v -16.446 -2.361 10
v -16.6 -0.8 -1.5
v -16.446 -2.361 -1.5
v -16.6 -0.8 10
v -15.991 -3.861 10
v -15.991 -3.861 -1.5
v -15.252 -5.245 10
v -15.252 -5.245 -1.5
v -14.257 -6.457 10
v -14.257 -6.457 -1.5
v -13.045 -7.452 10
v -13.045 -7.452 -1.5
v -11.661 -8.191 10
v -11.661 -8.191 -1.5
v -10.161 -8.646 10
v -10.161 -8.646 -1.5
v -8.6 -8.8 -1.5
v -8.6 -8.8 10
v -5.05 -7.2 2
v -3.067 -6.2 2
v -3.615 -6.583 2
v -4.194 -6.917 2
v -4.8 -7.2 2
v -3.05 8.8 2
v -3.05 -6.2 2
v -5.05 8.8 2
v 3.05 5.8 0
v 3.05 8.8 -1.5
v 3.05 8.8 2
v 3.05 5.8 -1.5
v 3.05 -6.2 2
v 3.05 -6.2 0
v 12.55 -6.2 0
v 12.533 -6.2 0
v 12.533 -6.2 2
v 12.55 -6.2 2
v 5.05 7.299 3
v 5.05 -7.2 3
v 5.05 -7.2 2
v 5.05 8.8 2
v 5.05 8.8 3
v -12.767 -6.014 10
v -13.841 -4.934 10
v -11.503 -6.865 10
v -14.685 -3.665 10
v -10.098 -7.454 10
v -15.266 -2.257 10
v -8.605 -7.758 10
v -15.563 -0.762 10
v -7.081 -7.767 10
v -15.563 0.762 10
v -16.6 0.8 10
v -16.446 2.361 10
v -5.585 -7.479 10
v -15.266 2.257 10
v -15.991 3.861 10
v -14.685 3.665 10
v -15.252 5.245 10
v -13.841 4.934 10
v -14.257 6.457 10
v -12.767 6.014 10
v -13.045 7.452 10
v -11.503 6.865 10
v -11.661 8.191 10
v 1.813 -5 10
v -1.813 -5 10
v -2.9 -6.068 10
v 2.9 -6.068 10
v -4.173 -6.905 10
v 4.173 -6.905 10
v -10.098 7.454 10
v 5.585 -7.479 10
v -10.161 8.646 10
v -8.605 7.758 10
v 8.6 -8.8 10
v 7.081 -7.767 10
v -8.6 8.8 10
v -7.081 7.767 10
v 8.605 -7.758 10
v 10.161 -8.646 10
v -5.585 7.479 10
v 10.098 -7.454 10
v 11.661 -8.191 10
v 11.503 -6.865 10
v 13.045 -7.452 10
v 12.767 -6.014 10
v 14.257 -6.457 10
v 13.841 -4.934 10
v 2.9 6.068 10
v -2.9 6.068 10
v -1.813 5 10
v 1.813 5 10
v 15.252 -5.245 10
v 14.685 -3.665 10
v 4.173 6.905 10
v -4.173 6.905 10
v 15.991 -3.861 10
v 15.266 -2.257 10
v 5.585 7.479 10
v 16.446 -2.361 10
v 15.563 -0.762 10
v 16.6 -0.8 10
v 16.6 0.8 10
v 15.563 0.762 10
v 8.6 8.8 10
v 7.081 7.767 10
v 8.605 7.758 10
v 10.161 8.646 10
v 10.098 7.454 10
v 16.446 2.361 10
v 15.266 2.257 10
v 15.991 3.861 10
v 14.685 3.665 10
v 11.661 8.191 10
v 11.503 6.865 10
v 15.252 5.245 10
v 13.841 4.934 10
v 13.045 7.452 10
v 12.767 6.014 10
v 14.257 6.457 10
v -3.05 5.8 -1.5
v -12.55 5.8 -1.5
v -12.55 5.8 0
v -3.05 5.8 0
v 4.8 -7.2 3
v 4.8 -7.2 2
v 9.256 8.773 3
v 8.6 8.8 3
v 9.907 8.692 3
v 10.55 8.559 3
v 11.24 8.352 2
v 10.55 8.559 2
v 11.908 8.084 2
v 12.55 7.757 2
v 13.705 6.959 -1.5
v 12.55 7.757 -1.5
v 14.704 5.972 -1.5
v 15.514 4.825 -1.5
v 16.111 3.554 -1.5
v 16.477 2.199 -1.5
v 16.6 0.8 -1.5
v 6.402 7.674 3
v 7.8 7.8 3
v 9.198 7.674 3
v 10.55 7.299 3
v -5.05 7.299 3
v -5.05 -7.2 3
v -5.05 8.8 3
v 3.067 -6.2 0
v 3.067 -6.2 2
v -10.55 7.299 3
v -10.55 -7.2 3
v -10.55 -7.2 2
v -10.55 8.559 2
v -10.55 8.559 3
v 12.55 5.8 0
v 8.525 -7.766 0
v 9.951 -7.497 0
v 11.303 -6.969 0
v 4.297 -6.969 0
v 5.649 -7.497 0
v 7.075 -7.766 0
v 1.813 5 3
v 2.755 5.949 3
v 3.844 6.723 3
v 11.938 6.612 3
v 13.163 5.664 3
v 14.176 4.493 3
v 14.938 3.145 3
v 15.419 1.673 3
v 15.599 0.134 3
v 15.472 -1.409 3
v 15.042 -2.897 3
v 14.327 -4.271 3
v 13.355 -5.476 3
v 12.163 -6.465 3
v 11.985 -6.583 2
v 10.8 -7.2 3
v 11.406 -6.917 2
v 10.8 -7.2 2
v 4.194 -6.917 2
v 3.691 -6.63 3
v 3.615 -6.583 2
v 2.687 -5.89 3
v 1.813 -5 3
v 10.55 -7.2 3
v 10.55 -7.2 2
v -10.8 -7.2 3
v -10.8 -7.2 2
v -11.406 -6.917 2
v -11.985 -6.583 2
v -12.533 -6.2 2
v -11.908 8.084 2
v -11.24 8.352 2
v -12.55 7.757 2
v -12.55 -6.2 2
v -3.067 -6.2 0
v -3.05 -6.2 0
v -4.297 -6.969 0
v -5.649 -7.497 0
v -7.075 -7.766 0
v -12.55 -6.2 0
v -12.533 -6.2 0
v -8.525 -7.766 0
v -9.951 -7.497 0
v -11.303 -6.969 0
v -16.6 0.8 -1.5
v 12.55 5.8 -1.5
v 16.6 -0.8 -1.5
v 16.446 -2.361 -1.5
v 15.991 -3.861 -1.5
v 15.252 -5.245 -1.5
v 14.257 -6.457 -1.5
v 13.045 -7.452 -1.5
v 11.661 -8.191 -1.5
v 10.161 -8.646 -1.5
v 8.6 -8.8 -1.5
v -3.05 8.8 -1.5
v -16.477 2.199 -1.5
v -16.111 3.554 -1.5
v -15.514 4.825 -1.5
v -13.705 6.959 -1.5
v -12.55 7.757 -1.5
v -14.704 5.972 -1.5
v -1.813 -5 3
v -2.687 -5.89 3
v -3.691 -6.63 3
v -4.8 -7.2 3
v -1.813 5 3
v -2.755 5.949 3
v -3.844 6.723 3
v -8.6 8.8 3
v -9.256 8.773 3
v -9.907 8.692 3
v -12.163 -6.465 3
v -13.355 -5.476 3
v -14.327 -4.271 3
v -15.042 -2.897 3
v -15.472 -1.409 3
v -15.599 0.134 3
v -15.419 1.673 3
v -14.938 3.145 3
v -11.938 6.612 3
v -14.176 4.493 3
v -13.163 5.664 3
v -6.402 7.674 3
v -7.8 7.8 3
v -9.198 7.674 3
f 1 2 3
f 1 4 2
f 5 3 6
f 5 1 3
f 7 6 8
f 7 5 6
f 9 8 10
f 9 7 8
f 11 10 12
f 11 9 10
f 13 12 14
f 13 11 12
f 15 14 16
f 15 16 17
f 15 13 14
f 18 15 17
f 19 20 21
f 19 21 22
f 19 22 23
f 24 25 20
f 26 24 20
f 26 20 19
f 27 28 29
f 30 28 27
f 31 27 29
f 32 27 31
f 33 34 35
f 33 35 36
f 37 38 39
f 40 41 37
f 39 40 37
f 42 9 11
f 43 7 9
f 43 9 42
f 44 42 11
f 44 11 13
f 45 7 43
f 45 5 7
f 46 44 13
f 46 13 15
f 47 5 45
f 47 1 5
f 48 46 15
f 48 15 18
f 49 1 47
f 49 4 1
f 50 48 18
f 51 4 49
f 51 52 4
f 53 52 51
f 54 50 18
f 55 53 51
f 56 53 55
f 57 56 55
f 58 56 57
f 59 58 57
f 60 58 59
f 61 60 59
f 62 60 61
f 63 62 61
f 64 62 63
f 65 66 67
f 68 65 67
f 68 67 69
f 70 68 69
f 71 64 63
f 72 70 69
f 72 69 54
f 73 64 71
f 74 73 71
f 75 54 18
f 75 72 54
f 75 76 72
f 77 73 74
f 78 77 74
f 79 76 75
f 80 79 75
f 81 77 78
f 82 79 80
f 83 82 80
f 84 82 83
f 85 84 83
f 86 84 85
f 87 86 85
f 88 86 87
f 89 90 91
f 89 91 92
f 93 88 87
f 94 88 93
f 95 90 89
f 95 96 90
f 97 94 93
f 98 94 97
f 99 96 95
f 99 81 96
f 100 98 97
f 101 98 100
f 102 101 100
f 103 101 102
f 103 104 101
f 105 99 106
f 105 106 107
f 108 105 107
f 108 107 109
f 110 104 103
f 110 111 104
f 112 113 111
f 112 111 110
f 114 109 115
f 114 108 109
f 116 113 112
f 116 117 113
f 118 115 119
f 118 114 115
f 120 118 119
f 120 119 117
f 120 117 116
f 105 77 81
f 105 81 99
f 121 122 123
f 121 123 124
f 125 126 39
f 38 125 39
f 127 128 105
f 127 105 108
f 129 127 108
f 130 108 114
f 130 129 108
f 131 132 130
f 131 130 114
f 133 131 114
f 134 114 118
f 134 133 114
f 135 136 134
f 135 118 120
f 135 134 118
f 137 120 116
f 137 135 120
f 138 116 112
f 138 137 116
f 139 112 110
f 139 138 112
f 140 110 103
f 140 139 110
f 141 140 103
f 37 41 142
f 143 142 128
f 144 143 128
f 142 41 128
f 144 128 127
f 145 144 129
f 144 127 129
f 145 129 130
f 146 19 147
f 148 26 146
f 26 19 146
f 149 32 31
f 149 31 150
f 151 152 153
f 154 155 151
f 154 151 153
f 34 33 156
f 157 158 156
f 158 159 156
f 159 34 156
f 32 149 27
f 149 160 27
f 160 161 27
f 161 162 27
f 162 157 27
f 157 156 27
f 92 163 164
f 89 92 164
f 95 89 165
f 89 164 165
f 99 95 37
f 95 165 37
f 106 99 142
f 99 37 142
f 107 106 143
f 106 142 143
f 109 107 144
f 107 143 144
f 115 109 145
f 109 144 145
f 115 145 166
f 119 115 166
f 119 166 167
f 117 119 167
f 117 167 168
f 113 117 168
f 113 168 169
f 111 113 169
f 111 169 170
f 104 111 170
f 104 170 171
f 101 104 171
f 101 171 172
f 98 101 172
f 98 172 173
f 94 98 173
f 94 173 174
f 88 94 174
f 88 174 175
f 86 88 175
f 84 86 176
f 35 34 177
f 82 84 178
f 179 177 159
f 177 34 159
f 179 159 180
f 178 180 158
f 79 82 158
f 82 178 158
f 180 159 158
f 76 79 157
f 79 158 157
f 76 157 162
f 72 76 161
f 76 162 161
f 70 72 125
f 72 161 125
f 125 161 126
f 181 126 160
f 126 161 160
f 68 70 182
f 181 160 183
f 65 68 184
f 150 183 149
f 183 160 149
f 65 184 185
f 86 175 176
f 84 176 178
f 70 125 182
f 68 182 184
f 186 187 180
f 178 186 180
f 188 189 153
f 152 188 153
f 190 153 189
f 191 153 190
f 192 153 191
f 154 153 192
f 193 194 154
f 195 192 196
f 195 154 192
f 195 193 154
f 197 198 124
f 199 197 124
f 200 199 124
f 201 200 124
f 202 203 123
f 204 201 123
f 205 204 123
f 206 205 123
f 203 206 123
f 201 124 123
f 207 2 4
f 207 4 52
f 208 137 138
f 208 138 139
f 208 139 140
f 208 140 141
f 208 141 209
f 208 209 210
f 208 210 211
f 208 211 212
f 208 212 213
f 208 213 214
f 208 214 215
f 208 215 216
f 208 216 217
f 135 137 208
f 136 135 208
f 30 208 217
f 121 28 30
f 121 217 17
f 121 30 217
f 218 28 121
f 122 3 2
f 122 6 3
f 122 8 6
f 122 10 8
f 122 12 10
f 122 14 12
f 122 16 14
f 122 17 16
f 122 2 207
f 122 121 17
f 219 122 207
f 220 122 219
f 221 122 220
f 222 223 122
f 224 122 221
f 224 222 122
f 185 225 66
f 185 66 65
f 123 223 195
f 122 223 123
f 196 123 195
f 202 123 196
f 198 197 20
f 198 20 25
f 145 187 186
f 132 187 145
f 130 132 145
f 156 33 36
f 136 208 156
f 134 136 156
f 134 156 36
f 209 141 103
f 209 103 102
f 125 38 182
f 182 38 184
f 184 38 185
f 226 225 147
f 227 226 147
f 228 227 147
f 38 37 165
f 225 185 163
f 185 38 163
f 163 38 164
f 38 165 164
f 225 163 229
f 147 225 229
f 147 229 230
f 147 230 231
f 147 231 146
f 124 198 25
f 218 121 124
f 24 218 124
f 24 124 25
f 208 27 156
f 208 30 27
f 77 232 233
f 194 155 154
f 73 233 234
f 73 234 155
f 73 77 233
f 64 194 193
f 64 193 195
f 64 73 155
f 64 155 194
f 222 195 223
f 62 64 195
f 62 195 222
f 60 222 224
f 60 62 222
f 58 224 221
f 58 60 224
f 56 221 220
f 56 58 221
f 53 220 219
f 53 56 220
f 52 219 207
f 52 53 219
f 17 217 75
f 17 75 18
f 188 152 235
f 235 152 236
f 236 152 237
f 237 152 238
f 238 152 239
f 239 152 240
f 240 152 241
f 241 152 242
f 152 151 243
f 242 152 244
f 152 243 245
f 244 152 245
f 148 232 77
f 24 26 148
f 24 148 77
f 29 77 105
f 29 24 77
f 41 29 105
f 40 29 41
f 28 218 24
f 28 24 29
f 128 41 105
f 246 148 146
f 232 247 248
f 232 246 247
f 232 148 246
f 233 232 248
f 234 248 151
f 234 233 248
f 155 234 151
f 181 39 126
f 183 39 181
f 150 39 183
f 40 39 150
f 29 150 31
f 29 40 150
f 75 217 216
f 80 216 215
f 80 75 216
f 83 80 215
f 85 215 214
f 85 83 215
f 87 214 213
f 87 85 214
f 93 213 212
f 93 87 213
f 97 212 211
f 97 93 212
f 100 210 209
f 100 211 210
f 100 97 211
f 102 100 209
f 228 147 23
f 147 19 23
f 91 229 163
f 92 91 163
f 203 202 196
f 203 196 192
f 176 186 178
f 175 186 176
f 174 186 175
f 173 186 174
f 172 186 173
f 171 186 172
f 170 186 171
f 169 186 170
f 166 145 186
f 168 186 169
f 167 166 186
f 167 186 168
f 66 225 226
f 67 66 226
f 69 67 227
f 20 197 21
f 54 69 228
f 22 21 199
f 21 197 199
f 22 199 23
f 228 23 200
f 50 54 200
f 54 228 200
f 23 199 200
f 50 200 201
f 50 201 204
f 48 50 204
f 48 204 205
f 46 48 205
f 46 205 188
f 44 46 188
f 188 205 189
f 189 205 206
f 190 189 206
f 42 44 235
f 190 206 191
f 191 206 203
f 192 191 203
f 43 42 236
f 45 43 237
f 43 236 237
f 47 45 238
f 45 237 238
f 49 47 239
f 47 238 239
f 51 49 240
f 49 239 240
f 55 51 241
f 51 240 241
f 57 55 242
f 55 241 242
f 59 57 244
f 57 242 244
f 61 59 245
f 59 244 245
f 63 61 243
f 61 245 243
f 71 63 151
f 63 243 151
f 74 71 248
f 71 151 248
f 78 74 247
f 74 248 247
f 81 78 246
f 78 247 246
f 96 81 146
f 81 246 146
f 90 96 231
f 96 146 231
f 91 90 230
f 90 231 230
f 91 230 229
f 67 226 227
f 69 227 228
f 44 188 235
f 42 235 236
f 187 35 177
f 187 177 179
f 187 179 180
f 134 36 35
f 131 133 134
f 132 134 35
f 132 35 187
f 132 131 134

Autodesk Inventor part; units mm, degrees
ref_plane "YZ Plane" through (0, 0, 0) normal (1, 0, 0) x (0, 1, 0)
ref_plane "XZ Plane" through (0, 0, 0) normal (0, 1, 0) x (-1, 0, 0)
ref_plane "XY Plane" through (0, 0, 0) normal (0, 0, 1) x (1, 0, 0)
sketch "スケッチ4" plane through (0, 0, 0) normal (0, 0, 1) x (1, 0, 0)
  circle A0 centre (-7.8, 0) radius 7.8
  circle A1 centre (7.8, 0) radius 7.8
  line L0 (-15.6, -7.8) -> (15.6, -7.8)
  line L1 (15.6, -7.8) -> (15.6, 7.8)
  line L2 (15.6, 7.8) -> (-15.6, 7.8)
  line L3 (-15.6, 7.8) -> (-15.6, -7.8)
  line L4 (-16.6, 8.8) -> (16.6, 8.8)
  line L5 (16.6, 8.8) -> (16.6, -8.8)
  line L6 (16.6, -8.8) -> (-16.6, -8.8)
  line L7 (-16.6, -8.8) -> (-16.6, 8.8)
  line L8 (-1.8133, 5) -> (1.8133, 5)
  line L9 (-1.8133, -5) -> (1.8133, -5)
  point P0 (0, 0)
  dimension "d12" = 15.6
  dimension "d13" = 1
  dimension "d14" = 10
extrude "押し出し4" add sketch "スケッチ4" along normal blind 10 contours A0 L2 A1 L8 | L9 A1 L0 A0 | A0 L3 L2 | L0 L3 A0 | L2 L1 A1 | A1 L1 L0 | L4 L5 L6 L7
sketch "スケッチ5" plane through (0, 0, 0) normal (0, 0, -1) x (-1, 0, 0)
  arc A0 (-1.8133, 5) -> (-1.8133, -5) centre (-7.8, 0) ccw projected
  line L0 (-1.8133, 5) -> (1.8133, 5) projected
  arc A1 (1.8133, -5) -> (1.8133, 5) centre (7.8, 0) ccw projected
  line L1 (1.8133, -5) -> (-1.8133, -5) projected
  line L2 (16.6, 8.8) -> (-16.6, 8.8) projected
  line L3 (-16.6, 8.8) -> (-16.6, -8.8) projected
  line L4 (-16.6, -8.8) -> (16.6, -8.8) projected
  line L5 (16.6, -8.8) -> (16.6, 8.8) projected
  point P0 (0, 0)
extrude "押し出し5" add sketch "スケッチ5" along normal blind 1.5 contours L0 A1 L1 A0 | L5 L4 L3 L2
sketch "スケッチ6" plane through (-16.6, 8.8, 10) normal (0, 1, 0) x (1, 0, 0)
  line L0 (14.7867, 10) -> (14.7867, 10) construction
  line L1 (14.7867, 10) -> (14.7867, 0) construction
  line L2 (14.7867, 0) -> (14.7867, 0) construction
  line L3 (14.7867, 10) -> (14.7867, 0) construction
  line L4 (18.4133, 10) -> (18.4133, 10) construction
  line L5 (18.4133, 10) -> (18.4133, 0) construction
  line L6 (18.4133, 0) -> (18.4133, 0) construction
  line L7 (18.4133, 10) -> (18.4133, 0) construction
  line L8 (18.4133, 10) -> (18.4133, 10) construction
  line L9 (18.4133, 10) -> (14.7867, 10) construction
  line L10 (14.7867, 10) -> (14.7867, 10) construction
  line L11 (14.7867, 10) -> (18.4133, 10) construction
  line L12 (14.7867, 10) -> (1, 10) construction
  line L13 (1, 10) -> (1, 8) construction
  line L14 (1, 8) -> (16.6, 8) construction
  line L15 (14.7867, 8) -> (14.7867, 10) construction
  line L16 (32.2, 10) -> (32.2, 0) construction
  line L17 (18.4133, 10) -> (32.2, 10) construction
  line L18 (32.2, 10) -> (32.2, 8) construction
  line L19 (32.2, 8) -> (16.6, 8) construction
  line L20 (18.4133, 7.5) -> (18.4133, 10) construction
  line L21 (4.05, 10) -> (13.55, 10)
  line L22 (13.55, 10) -> (13.55, 8)
  line L23 (13.55, 8) -> (4.05, 8)
  line L24 (4.05, 8) -> (4.05, 10)
  line L25 (18.4133, 10) -> (32.2, 10) projected
  line L26 (19.65, 10) -> (29.15, 10)
  line L27 (29.15, 10) -> (29.15, 8)
  line L28 (29.15, 8) -> (19.65, 8)
  line L29 (19.65, 8) -> (19.65, 10)
  line L30 (1, 10) -> (16.6, 10)
  line L31 (16.6, 10) -> (16.6, 7)
  line L32 (16.6, 7) -> (1, 7)
  line L33 (1, 7) -> (1, 10)
  line L34 (32.2, 10) -> (16.6, 10)
  line L35 (16.6, 10) -> (16.6, 7)
  line L36 (16.6, 7) -> (32.2, 7)
  line L37 (32.2, 7) -> (32.2, 10)
  line L38 (6.05, 8) -> (11.55, 8)
  line L39 (11.55, 8) -> (11.55, 7)
  line L40 (11.55, 7) -> (6.05, 7)
  line L41 (6.05, 7) -> (6.05, 8)
  line L42 (21.65, 8) -> (27.15, 8)
  line L43 (27.15, 8) -> (27.15, 7)
  line L44 (27.15, 7) -> (21.65, 7)
  line L45 (21.65, 7) -> (21.65, 8)
  point P0 (16.6, 10)
  point P1 (24.4, 8)
  point P2 (8.8, 8)
  dimension "d19" = 2
  dimension "d20" = 9.5
  dimension "d21" = 1
  dimension "d22" = 5.5
extrude "押し出し6" cut sketch "スケッチ6" against normal blind 15 contours L21 L22 L23 L24 | L23 L39 L32 L41 | L45 L28 L43 L36 | L25 L27 L28 L29
extrude "押し出し7" add sketch "スケッチ6" against normal blind 16 contours L24 L23 L41 L32 L33 L30 | L30 L31 L32 L39 L23 L22 | L34 L25 L29 L28 L45 L36 L31 | L43 L28 L27 L25 L37 L36
sketch "スケッチ7" plane through (0, 0, -1.5) normal (0, 0, -1) x (-1, 0, 0)
  line L0 (12.55, 8.8) -> (12.55, -6.2) construction
  line L1 (3.05, 8.8) -> (3.05, -6.2) construction
  line L2 (12.55, 8.8) -> (3.05, 8.8) construction
  line L3 (-12.55, 8.8) -> (-12.55, -6.2) construction
  line L4 (-3.05, 8.8) -> (-12.55, 8.8) construction
  line L5 (-3.05, 8.8) -> (-3.05, -6.2) construction
  line L6 (-3.05, 8.8) -> (-3.05, -6.2) projected
  line L7 (-12.55, 8.8) -> (-3.05, 8.8)
  line L8 (-3.05, 8.8) -> (-3.05, 5.8)
  line L9 (-3.05, 5.8) -> (-12.55, 5.8)
  line L10 (-12.55, 5.8) -> (-12.55, 8.8)
  line L11 (3.05, 8.8) -> (12.55, 8.8)
  line L12 (12.55, 8.8) -> (12.55, 5.8)
  line L13 (12.55, 5.8) -> (3.05, 5.8)
  line L14 (3.05, 5.8) -> (3.05, 8.8)
  line L15 (-3.05, -6.2) -> (-3.0671, -6.2) projected
  arc A0 (-12.5329, -6.2) -> (-3.0671, -6.2) centre (-7.8, 0) ccw projected
  line L16 (-12.5329, -6.2) -> (-12.55, -6.2) projected
  line L17 (12.55, -6.2) -> (12.5329, -6.2) projected
  arc A1 (3.0671, -6.2) -> (12.5329, -6.2) centre (7.8, 0) ccw projected
  line L18 (3.0671, -6.2) -> (3.05, -6.2) projected
  point P0 (0, 0)
  point P1 (-3.05, -5.2)
  dimension "d27" = 3
extrude "押し出し8" cut sketch "スケッチ7" against normal up to next
fillet "フィレット1" radius 8 4 edges at (16.6, 8.8, 4.25) (16.6, -8.8, 4.25) (-16.6, 8.8, 4.25) (-16.6, -8.8, 4.25)
properties part number "CaseBottom_CR123A"
